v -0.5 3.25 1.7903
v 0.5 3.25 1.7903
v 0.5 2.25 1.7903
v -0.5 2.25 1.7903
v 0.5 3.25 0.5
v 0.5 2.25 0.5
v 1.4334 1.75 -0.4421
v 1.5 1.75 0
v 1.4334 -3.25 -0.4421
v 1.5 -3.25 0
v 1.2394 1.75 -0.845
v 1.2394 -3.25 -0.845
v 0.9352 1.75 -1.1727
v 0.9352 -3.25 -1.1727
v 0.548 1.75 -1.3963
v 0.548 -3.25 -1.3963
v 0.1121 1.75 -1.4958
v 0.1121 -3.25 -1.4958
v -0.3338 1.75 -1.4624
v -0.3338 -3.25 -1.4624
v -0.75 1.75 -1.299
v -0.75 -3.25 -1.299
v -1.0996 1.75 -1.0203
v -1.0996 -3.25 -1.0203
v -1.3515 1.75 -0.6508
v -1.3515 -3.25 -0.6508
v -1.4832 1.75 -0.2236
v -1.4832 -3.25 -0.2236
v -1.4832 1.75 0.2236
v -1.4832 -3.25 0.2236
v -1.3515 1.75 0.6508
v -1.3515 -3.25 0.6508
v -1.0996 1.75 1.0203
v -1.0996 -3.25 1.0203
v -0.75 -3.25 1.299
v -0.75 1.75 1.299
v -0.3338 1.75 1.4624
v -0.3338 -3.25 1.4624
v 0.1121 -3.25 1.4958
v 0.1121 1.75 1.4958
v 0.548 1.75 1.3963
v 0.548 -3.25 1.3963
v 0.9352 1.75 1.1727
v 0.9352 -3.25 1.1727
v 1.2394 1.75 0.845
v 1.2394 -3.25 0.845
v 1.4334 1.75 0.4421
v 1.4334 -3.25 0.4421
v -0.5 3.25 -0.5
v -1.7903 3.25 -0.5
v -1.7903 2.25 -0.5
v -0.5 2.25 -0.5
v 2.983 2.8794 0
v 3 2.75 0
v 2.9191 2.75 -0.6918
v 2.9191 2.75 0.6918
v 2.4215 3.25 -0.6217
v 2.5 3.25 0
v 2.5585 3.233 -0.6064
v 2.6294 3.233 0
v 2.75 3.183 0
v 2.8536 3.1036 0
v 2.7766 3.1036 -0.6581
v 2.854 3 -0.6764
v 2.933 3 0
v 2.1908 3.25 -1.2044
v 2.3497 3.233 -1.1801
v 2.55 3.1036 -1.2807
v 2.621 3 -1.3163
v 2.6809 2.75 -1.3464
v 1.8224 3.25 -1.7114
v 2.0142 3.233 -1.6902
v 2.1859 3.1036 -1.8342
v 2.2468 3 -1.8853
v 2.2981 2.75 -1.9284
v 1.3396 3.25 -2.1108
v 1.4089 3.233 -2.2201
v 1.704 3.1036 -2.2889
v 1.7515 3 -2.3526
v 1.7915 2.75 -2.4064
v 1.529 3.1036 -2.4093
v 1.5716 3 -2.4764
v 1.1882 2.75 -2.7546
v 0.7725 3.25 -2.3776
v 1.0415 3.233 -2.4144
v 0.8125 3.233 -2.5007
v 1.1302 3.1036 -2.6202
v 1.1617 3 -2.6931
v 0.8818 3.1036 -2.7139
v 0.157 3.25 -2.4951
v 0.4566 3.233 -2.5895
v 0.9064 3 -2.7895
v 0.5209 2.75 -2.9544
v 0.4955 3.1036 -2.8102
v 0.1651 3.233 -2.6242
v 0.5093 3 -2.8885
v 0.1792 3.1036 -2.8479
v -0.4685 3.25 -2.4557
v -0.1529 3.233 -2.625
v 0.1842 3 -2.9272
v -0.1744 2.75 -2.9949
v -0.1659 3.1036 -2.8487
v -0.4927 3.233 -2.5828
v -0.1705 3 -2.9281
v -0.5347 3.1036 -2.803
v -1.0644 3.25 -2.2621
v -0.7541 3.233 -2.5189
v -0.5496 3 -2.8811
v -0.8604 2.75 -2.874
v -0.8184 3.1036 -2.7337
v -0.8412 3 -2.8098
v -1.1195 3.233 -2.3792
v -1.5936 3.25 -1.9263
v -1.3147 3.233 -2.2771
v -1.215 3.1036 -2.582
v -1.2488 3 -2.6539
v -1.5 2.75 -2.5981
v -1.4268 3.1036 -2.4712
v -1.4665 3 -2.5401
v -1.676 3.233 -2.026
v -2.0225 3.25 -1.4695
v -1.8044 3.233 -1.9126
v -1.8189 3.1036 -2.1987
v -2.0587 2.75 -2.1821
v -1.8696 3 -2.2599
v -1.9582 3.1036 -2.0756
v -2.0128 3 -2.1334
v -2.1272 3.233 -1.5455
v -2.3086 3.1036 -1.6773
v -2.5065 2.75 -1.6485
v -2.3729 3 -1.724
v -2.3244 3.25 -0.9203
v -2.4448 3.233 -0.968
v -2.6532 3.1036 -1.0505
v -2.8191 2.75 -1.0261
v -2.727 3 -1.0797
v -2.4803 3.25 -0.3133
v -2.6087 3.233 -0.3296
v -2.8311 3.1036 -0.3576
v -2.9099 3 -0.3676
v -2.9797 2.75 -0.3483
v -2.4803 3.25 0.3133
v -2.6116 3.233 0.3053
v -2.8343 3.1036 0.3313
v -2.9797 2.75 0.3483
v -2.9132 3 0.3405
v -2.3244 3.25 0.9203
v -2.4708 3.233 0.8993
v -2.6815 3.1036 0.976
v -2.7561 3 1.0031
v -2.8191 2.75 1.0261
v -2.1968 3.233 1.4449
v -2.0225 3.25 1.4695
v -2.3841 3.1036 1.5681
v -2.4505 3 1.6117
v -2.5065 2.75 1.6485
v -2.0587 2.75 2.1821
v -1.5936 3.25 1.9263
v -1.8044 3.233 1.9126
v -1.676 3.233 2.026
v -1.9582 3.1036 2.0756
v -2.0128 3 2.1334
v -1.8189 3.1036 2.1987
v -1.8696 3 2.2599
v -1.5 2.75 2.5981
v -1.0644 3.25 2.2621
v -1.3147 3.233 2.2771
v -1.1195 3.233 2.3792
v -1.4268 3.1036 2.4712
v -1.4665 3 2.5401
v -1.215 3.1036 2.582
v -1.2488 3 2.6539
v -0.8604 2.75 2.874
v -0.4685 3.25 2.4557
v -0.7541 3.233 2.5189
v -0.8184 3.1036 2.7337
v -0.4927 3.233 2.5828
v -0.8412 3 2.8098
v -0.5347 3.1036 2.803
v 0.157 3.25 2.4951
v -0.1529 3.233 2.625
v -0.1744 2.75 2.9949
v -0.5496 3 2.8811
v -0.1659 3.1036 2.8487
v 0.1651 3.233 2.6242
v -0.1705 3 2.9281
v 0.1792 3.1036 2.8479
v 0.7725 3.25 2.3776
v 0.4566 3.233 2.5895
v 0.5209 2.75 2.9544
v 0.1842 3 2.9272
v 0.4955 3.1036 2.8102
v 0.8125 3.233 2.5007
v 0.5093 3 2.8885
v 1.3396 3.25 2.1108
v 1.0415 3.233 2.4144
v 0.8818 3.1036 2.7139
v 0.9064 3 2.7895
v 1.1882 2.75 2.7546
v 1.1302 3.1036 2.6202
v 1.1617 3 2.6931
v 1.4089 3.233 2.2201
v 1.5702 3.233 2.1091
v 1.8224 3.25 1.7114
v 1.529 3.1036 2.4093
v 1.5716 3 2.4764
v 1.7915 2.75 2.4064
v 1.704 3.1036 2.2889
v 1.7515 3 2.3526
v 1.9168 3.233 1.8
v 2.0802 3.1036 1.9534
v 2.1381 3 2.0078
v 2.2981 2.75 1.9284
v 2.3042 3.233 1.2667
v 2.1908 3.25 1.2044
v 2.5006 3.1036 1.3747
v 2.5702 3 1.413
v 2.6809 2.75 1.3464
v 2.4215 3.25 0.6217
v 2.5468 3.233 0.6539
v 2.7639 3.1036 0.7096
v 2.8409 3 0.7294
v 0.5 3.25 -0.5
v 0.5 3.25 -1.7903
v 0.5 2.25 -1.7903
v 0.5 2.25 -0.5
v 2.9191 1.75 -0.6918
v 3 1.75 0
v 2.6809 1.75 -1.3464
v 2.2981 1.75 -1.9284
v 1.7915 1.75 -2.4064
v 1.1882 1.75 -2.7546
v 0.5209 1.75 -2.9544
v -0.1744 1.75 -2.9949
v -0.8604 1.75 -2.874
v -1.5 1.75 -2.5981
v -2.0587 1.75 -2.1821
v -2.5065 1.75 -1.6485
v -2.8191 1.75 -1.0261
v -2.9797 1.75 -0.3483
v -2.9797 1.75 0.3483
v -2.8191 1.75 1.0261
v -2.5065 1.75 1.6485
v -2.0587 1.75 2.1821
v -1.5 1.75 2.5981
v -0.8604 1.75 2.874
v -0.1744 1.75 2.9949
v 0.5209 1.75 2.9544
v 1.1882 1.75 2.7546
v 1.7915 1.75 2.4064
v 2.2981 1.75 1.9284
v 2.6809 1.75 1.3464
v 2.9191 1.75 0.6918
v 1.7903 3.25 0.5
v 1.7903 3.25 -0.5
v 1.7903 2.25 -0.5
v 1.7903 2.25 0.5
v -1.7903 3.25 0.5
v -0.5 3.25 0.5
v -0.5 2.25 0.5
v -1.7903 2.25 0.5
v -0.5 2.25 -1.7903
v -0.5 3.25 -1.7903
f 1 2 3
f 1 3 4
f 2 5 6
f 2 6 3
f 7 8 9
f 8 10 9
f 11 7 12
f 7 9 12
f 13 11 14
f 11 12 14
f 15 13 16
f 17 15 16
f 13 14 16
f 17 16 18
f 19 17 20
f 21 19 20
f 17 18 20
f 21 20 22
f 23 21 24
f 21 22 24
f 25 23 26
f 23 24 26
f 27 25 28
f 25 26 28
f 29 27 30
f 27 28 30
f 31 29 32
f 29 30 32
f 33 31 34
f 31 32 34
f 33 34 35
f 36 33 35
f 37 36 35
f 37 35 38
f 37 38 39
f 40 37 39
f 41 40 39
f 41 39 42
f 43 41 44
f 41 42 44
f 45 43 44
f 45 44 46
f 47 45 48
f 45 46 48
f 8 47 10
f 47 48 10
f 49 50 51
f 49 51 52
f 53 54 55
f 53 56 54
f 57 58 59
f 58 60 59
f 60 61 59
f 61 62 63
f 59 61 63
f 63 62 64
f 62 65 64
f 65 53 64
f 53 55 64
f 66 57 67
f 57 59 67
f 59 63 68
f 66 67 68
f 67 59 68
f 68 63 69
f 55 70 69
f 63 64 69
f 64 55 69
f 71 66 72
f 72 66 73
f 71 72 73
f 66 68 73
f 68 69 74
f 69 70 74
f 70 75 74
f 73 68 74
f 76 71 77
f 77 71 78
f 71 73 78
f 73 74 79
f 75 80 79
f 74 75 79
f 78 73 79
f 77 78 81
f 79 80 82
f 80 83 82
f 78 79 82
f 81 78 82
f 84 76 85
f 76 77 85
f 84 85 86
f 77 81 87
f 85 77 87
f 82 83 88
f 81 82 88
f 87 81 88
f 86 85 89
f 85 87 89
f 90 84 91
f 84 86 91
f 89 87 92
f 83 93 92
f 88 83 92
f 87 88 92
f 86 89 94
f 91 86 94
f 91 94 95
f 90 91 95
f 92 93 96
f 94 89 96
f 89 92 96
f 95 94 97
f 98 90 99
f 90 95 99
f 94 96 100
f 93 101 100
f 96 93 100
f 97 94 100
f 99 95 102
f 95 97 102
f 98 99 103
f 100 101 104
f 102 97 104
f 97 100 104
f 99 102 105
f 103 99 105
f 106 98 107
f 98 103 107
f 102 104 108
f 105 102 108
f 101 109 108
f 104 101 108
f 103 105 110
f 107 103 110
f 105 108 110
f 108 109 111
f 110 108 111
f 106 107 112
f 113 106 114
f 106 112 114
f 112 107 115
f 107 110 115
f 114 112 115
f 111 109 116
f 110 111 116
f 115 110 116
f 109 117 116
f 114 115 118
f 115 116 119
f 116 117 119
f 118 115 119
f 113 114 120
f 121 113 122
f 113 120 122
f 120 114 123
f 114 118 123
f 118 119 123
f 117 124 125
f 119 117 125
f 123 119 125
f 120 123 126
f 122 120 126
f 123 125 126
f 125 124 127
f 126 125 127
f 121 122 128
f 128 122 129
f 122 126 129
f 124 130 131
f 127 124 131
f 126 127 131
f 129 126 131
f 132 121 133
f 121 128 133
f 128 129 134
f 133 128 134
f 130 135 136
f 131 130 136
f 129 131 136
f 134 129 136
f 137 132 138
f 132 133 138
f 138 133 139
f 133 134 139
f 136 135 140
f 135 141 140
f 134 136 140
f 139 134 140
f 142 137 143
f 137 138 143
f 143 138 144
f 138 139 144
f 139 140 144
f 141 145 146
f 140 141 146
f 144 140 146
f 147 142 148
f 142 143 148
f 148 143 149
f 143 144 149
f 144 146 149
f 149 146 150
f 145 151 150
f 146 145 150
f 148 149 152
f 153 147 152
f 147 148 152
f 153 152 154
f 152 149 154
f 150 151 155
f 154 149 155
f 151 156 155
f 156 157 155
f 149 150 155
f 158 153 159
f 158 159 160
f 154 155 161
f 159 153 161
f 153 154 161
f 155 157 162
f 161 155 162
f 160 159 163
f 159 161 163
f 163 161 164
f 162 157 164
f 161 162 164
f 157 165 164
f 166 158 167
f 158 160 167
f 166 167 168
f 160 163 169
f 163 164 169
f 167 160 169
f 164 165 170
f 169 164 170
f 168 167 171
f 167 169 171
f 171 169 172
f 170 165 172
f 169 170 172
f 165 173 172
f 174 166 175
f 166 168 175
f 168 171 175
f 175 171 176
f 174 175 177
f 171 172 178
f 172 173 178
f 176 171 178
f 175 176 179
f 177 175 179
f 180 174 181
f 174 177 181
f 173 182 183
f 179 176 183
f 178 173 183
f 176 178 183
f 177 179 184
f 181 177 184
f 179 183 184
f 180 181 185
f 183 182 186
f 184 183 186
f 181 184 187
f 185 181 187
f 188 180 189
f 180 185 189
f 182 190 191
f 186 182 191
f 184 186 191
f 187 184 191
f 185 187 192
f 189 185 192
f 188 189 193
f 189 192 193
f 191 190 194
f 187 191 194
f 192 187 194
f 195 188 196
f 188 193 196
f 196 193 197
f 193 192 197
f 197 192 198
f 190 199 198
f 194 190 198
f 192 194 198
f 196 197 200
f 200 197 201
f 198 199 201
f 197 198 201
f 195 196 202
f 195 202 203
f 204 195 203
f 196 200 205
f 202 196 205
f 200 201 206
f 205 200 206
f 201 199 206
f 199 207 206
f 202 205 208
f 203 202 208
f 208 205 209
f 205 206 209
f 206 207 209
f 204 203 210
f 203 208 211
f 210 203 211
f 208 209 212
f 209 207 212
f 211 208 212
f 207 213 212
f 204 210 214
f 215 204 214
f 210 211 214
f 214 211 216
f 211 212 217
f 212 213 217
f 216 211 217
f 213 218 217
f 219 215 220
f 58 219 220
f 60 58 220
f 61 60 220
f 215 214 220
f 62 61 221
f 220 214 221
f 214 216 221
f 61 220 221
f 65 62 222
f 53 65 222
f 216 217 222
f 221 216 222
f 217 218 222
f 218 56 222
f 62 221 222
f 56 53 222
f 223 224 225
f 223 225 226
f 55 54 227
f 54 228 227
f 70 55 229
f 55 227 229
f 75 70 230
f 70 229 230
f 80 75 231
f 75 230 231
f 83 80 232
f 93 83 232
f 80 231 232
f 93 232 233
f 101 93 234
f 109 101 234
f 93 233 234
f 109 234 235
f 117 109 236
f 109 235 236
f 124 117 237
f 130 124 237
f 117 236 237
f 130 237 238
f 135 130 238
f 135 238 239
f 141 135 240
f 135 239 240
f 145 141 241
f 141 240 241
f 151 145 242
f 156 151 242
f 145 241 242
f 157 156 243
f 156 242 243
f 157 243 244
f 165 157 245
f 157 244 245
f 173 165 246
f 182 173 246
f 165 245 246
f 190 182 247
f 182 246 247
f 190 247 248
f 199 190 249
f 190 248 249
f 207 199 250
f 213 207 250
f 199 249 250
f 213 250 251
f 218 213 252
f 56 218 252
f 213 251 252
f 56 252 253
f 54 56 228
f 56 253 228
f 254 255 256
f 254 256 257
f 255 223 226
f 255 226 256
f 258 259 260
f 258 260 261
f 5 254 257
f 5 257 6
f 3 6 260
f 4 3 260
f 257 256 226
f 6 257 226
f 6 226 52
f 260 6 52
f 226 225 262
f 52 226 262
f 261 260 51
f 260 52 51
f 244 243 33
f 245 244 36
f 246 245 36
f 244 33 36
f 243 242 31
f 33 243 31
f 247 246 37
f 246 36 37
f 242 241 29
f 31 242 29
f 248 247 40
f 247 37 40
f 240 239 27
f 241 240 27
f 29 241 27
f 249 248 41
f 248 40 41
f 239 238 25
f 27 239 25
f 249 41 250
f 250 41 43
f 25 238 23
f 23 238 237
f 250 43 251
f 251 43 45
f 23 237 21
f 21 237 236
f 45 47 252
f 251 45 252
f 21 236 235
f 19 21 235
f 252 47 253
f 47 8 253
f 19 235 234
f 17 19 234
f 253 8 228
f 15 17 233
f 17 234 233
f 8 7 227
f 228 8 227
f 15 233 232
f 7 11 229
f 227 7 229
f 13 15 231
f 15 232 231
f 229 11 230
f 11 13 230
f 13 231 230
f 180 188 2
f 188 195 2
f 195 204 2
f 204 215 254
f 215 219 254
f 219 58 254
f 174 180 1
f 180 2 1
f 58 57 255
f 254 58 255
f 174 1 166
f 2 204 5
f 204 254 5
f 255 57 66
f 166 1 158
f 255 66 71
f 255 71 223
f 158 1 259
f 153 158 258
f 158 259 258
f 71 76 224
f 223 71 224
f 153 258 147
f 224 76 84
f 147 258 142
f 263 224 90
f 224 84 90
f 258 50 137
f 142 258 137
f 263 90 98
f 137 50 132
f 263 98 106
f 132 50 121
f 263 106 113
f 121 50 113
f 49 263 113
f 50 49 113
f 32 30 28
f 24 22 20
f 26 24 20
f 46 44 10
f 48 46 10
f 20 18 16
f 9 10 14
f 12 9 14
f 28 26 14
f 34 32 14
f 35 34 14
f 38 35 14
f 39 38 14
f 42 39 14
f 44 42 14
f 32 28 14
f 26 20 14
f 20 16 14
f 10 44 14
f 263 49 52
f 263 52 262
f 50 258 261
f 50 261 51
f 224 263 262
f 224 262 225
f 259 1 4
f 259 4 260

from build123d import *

# Parameters (mm, degrees)
CUT_EXTRUDE2_DEPTH = 1


with BuildPart() as part:
    # Sketch3 → Revolve1 (revolve)
    with BuildSketch(Plane.XY, mode=Mode.PRIVATE) as revolve1_sk:
        with BuildLine():
            Line((-1.5, 1.75), (-1.5, -3.25))
            Line((-1.5, -3.25), (0, -3.25))
            Line((0, -3.25), (0, 3.25))
            Line((0, 3.25), (-2.5, 3.25))
            ThreePointArc((-2.5, 3.25), (-2.853553391, 3.103553391), (-3, 2.75))
            Line((-3, 2.75), (-3, 1.75))
            Line((-3, 1.75), (-1.5, 1.75))
        make_face()
    revolve(revolve1_sk.sketch.rotate(Axis((0, -3.25, 0), (0, 1, 0)), 180), axis=Axis((0, -3.25, 0), (0, 1, 0)))

    # Sketch5 → Cut-Extrude2 (cut)
    with BuildSketch(Plane(origin=(0, 3.25, 0), x_dir=(1, 0, 0), z_dir=(0, 1, 0))):
        Polygon((-0.5, 1.790322581), (0.5, 1.790322581), (0.5, 0.5), (1.790322581, 0.5), (1.790322581, -0.5), (0.5, -0.5), (0.5, -1.790322581), (-0.5, -1.790322581), (-0.5, -0.5), (-1.790322581, -0.5), (-1.790322581, 0.5), (-0.5, 0.5), align=None)
    extrude(amount=-CUT_EXTRUDE2_DEPTH, mode=Mode.SUBTRACT)


solid = part.part
